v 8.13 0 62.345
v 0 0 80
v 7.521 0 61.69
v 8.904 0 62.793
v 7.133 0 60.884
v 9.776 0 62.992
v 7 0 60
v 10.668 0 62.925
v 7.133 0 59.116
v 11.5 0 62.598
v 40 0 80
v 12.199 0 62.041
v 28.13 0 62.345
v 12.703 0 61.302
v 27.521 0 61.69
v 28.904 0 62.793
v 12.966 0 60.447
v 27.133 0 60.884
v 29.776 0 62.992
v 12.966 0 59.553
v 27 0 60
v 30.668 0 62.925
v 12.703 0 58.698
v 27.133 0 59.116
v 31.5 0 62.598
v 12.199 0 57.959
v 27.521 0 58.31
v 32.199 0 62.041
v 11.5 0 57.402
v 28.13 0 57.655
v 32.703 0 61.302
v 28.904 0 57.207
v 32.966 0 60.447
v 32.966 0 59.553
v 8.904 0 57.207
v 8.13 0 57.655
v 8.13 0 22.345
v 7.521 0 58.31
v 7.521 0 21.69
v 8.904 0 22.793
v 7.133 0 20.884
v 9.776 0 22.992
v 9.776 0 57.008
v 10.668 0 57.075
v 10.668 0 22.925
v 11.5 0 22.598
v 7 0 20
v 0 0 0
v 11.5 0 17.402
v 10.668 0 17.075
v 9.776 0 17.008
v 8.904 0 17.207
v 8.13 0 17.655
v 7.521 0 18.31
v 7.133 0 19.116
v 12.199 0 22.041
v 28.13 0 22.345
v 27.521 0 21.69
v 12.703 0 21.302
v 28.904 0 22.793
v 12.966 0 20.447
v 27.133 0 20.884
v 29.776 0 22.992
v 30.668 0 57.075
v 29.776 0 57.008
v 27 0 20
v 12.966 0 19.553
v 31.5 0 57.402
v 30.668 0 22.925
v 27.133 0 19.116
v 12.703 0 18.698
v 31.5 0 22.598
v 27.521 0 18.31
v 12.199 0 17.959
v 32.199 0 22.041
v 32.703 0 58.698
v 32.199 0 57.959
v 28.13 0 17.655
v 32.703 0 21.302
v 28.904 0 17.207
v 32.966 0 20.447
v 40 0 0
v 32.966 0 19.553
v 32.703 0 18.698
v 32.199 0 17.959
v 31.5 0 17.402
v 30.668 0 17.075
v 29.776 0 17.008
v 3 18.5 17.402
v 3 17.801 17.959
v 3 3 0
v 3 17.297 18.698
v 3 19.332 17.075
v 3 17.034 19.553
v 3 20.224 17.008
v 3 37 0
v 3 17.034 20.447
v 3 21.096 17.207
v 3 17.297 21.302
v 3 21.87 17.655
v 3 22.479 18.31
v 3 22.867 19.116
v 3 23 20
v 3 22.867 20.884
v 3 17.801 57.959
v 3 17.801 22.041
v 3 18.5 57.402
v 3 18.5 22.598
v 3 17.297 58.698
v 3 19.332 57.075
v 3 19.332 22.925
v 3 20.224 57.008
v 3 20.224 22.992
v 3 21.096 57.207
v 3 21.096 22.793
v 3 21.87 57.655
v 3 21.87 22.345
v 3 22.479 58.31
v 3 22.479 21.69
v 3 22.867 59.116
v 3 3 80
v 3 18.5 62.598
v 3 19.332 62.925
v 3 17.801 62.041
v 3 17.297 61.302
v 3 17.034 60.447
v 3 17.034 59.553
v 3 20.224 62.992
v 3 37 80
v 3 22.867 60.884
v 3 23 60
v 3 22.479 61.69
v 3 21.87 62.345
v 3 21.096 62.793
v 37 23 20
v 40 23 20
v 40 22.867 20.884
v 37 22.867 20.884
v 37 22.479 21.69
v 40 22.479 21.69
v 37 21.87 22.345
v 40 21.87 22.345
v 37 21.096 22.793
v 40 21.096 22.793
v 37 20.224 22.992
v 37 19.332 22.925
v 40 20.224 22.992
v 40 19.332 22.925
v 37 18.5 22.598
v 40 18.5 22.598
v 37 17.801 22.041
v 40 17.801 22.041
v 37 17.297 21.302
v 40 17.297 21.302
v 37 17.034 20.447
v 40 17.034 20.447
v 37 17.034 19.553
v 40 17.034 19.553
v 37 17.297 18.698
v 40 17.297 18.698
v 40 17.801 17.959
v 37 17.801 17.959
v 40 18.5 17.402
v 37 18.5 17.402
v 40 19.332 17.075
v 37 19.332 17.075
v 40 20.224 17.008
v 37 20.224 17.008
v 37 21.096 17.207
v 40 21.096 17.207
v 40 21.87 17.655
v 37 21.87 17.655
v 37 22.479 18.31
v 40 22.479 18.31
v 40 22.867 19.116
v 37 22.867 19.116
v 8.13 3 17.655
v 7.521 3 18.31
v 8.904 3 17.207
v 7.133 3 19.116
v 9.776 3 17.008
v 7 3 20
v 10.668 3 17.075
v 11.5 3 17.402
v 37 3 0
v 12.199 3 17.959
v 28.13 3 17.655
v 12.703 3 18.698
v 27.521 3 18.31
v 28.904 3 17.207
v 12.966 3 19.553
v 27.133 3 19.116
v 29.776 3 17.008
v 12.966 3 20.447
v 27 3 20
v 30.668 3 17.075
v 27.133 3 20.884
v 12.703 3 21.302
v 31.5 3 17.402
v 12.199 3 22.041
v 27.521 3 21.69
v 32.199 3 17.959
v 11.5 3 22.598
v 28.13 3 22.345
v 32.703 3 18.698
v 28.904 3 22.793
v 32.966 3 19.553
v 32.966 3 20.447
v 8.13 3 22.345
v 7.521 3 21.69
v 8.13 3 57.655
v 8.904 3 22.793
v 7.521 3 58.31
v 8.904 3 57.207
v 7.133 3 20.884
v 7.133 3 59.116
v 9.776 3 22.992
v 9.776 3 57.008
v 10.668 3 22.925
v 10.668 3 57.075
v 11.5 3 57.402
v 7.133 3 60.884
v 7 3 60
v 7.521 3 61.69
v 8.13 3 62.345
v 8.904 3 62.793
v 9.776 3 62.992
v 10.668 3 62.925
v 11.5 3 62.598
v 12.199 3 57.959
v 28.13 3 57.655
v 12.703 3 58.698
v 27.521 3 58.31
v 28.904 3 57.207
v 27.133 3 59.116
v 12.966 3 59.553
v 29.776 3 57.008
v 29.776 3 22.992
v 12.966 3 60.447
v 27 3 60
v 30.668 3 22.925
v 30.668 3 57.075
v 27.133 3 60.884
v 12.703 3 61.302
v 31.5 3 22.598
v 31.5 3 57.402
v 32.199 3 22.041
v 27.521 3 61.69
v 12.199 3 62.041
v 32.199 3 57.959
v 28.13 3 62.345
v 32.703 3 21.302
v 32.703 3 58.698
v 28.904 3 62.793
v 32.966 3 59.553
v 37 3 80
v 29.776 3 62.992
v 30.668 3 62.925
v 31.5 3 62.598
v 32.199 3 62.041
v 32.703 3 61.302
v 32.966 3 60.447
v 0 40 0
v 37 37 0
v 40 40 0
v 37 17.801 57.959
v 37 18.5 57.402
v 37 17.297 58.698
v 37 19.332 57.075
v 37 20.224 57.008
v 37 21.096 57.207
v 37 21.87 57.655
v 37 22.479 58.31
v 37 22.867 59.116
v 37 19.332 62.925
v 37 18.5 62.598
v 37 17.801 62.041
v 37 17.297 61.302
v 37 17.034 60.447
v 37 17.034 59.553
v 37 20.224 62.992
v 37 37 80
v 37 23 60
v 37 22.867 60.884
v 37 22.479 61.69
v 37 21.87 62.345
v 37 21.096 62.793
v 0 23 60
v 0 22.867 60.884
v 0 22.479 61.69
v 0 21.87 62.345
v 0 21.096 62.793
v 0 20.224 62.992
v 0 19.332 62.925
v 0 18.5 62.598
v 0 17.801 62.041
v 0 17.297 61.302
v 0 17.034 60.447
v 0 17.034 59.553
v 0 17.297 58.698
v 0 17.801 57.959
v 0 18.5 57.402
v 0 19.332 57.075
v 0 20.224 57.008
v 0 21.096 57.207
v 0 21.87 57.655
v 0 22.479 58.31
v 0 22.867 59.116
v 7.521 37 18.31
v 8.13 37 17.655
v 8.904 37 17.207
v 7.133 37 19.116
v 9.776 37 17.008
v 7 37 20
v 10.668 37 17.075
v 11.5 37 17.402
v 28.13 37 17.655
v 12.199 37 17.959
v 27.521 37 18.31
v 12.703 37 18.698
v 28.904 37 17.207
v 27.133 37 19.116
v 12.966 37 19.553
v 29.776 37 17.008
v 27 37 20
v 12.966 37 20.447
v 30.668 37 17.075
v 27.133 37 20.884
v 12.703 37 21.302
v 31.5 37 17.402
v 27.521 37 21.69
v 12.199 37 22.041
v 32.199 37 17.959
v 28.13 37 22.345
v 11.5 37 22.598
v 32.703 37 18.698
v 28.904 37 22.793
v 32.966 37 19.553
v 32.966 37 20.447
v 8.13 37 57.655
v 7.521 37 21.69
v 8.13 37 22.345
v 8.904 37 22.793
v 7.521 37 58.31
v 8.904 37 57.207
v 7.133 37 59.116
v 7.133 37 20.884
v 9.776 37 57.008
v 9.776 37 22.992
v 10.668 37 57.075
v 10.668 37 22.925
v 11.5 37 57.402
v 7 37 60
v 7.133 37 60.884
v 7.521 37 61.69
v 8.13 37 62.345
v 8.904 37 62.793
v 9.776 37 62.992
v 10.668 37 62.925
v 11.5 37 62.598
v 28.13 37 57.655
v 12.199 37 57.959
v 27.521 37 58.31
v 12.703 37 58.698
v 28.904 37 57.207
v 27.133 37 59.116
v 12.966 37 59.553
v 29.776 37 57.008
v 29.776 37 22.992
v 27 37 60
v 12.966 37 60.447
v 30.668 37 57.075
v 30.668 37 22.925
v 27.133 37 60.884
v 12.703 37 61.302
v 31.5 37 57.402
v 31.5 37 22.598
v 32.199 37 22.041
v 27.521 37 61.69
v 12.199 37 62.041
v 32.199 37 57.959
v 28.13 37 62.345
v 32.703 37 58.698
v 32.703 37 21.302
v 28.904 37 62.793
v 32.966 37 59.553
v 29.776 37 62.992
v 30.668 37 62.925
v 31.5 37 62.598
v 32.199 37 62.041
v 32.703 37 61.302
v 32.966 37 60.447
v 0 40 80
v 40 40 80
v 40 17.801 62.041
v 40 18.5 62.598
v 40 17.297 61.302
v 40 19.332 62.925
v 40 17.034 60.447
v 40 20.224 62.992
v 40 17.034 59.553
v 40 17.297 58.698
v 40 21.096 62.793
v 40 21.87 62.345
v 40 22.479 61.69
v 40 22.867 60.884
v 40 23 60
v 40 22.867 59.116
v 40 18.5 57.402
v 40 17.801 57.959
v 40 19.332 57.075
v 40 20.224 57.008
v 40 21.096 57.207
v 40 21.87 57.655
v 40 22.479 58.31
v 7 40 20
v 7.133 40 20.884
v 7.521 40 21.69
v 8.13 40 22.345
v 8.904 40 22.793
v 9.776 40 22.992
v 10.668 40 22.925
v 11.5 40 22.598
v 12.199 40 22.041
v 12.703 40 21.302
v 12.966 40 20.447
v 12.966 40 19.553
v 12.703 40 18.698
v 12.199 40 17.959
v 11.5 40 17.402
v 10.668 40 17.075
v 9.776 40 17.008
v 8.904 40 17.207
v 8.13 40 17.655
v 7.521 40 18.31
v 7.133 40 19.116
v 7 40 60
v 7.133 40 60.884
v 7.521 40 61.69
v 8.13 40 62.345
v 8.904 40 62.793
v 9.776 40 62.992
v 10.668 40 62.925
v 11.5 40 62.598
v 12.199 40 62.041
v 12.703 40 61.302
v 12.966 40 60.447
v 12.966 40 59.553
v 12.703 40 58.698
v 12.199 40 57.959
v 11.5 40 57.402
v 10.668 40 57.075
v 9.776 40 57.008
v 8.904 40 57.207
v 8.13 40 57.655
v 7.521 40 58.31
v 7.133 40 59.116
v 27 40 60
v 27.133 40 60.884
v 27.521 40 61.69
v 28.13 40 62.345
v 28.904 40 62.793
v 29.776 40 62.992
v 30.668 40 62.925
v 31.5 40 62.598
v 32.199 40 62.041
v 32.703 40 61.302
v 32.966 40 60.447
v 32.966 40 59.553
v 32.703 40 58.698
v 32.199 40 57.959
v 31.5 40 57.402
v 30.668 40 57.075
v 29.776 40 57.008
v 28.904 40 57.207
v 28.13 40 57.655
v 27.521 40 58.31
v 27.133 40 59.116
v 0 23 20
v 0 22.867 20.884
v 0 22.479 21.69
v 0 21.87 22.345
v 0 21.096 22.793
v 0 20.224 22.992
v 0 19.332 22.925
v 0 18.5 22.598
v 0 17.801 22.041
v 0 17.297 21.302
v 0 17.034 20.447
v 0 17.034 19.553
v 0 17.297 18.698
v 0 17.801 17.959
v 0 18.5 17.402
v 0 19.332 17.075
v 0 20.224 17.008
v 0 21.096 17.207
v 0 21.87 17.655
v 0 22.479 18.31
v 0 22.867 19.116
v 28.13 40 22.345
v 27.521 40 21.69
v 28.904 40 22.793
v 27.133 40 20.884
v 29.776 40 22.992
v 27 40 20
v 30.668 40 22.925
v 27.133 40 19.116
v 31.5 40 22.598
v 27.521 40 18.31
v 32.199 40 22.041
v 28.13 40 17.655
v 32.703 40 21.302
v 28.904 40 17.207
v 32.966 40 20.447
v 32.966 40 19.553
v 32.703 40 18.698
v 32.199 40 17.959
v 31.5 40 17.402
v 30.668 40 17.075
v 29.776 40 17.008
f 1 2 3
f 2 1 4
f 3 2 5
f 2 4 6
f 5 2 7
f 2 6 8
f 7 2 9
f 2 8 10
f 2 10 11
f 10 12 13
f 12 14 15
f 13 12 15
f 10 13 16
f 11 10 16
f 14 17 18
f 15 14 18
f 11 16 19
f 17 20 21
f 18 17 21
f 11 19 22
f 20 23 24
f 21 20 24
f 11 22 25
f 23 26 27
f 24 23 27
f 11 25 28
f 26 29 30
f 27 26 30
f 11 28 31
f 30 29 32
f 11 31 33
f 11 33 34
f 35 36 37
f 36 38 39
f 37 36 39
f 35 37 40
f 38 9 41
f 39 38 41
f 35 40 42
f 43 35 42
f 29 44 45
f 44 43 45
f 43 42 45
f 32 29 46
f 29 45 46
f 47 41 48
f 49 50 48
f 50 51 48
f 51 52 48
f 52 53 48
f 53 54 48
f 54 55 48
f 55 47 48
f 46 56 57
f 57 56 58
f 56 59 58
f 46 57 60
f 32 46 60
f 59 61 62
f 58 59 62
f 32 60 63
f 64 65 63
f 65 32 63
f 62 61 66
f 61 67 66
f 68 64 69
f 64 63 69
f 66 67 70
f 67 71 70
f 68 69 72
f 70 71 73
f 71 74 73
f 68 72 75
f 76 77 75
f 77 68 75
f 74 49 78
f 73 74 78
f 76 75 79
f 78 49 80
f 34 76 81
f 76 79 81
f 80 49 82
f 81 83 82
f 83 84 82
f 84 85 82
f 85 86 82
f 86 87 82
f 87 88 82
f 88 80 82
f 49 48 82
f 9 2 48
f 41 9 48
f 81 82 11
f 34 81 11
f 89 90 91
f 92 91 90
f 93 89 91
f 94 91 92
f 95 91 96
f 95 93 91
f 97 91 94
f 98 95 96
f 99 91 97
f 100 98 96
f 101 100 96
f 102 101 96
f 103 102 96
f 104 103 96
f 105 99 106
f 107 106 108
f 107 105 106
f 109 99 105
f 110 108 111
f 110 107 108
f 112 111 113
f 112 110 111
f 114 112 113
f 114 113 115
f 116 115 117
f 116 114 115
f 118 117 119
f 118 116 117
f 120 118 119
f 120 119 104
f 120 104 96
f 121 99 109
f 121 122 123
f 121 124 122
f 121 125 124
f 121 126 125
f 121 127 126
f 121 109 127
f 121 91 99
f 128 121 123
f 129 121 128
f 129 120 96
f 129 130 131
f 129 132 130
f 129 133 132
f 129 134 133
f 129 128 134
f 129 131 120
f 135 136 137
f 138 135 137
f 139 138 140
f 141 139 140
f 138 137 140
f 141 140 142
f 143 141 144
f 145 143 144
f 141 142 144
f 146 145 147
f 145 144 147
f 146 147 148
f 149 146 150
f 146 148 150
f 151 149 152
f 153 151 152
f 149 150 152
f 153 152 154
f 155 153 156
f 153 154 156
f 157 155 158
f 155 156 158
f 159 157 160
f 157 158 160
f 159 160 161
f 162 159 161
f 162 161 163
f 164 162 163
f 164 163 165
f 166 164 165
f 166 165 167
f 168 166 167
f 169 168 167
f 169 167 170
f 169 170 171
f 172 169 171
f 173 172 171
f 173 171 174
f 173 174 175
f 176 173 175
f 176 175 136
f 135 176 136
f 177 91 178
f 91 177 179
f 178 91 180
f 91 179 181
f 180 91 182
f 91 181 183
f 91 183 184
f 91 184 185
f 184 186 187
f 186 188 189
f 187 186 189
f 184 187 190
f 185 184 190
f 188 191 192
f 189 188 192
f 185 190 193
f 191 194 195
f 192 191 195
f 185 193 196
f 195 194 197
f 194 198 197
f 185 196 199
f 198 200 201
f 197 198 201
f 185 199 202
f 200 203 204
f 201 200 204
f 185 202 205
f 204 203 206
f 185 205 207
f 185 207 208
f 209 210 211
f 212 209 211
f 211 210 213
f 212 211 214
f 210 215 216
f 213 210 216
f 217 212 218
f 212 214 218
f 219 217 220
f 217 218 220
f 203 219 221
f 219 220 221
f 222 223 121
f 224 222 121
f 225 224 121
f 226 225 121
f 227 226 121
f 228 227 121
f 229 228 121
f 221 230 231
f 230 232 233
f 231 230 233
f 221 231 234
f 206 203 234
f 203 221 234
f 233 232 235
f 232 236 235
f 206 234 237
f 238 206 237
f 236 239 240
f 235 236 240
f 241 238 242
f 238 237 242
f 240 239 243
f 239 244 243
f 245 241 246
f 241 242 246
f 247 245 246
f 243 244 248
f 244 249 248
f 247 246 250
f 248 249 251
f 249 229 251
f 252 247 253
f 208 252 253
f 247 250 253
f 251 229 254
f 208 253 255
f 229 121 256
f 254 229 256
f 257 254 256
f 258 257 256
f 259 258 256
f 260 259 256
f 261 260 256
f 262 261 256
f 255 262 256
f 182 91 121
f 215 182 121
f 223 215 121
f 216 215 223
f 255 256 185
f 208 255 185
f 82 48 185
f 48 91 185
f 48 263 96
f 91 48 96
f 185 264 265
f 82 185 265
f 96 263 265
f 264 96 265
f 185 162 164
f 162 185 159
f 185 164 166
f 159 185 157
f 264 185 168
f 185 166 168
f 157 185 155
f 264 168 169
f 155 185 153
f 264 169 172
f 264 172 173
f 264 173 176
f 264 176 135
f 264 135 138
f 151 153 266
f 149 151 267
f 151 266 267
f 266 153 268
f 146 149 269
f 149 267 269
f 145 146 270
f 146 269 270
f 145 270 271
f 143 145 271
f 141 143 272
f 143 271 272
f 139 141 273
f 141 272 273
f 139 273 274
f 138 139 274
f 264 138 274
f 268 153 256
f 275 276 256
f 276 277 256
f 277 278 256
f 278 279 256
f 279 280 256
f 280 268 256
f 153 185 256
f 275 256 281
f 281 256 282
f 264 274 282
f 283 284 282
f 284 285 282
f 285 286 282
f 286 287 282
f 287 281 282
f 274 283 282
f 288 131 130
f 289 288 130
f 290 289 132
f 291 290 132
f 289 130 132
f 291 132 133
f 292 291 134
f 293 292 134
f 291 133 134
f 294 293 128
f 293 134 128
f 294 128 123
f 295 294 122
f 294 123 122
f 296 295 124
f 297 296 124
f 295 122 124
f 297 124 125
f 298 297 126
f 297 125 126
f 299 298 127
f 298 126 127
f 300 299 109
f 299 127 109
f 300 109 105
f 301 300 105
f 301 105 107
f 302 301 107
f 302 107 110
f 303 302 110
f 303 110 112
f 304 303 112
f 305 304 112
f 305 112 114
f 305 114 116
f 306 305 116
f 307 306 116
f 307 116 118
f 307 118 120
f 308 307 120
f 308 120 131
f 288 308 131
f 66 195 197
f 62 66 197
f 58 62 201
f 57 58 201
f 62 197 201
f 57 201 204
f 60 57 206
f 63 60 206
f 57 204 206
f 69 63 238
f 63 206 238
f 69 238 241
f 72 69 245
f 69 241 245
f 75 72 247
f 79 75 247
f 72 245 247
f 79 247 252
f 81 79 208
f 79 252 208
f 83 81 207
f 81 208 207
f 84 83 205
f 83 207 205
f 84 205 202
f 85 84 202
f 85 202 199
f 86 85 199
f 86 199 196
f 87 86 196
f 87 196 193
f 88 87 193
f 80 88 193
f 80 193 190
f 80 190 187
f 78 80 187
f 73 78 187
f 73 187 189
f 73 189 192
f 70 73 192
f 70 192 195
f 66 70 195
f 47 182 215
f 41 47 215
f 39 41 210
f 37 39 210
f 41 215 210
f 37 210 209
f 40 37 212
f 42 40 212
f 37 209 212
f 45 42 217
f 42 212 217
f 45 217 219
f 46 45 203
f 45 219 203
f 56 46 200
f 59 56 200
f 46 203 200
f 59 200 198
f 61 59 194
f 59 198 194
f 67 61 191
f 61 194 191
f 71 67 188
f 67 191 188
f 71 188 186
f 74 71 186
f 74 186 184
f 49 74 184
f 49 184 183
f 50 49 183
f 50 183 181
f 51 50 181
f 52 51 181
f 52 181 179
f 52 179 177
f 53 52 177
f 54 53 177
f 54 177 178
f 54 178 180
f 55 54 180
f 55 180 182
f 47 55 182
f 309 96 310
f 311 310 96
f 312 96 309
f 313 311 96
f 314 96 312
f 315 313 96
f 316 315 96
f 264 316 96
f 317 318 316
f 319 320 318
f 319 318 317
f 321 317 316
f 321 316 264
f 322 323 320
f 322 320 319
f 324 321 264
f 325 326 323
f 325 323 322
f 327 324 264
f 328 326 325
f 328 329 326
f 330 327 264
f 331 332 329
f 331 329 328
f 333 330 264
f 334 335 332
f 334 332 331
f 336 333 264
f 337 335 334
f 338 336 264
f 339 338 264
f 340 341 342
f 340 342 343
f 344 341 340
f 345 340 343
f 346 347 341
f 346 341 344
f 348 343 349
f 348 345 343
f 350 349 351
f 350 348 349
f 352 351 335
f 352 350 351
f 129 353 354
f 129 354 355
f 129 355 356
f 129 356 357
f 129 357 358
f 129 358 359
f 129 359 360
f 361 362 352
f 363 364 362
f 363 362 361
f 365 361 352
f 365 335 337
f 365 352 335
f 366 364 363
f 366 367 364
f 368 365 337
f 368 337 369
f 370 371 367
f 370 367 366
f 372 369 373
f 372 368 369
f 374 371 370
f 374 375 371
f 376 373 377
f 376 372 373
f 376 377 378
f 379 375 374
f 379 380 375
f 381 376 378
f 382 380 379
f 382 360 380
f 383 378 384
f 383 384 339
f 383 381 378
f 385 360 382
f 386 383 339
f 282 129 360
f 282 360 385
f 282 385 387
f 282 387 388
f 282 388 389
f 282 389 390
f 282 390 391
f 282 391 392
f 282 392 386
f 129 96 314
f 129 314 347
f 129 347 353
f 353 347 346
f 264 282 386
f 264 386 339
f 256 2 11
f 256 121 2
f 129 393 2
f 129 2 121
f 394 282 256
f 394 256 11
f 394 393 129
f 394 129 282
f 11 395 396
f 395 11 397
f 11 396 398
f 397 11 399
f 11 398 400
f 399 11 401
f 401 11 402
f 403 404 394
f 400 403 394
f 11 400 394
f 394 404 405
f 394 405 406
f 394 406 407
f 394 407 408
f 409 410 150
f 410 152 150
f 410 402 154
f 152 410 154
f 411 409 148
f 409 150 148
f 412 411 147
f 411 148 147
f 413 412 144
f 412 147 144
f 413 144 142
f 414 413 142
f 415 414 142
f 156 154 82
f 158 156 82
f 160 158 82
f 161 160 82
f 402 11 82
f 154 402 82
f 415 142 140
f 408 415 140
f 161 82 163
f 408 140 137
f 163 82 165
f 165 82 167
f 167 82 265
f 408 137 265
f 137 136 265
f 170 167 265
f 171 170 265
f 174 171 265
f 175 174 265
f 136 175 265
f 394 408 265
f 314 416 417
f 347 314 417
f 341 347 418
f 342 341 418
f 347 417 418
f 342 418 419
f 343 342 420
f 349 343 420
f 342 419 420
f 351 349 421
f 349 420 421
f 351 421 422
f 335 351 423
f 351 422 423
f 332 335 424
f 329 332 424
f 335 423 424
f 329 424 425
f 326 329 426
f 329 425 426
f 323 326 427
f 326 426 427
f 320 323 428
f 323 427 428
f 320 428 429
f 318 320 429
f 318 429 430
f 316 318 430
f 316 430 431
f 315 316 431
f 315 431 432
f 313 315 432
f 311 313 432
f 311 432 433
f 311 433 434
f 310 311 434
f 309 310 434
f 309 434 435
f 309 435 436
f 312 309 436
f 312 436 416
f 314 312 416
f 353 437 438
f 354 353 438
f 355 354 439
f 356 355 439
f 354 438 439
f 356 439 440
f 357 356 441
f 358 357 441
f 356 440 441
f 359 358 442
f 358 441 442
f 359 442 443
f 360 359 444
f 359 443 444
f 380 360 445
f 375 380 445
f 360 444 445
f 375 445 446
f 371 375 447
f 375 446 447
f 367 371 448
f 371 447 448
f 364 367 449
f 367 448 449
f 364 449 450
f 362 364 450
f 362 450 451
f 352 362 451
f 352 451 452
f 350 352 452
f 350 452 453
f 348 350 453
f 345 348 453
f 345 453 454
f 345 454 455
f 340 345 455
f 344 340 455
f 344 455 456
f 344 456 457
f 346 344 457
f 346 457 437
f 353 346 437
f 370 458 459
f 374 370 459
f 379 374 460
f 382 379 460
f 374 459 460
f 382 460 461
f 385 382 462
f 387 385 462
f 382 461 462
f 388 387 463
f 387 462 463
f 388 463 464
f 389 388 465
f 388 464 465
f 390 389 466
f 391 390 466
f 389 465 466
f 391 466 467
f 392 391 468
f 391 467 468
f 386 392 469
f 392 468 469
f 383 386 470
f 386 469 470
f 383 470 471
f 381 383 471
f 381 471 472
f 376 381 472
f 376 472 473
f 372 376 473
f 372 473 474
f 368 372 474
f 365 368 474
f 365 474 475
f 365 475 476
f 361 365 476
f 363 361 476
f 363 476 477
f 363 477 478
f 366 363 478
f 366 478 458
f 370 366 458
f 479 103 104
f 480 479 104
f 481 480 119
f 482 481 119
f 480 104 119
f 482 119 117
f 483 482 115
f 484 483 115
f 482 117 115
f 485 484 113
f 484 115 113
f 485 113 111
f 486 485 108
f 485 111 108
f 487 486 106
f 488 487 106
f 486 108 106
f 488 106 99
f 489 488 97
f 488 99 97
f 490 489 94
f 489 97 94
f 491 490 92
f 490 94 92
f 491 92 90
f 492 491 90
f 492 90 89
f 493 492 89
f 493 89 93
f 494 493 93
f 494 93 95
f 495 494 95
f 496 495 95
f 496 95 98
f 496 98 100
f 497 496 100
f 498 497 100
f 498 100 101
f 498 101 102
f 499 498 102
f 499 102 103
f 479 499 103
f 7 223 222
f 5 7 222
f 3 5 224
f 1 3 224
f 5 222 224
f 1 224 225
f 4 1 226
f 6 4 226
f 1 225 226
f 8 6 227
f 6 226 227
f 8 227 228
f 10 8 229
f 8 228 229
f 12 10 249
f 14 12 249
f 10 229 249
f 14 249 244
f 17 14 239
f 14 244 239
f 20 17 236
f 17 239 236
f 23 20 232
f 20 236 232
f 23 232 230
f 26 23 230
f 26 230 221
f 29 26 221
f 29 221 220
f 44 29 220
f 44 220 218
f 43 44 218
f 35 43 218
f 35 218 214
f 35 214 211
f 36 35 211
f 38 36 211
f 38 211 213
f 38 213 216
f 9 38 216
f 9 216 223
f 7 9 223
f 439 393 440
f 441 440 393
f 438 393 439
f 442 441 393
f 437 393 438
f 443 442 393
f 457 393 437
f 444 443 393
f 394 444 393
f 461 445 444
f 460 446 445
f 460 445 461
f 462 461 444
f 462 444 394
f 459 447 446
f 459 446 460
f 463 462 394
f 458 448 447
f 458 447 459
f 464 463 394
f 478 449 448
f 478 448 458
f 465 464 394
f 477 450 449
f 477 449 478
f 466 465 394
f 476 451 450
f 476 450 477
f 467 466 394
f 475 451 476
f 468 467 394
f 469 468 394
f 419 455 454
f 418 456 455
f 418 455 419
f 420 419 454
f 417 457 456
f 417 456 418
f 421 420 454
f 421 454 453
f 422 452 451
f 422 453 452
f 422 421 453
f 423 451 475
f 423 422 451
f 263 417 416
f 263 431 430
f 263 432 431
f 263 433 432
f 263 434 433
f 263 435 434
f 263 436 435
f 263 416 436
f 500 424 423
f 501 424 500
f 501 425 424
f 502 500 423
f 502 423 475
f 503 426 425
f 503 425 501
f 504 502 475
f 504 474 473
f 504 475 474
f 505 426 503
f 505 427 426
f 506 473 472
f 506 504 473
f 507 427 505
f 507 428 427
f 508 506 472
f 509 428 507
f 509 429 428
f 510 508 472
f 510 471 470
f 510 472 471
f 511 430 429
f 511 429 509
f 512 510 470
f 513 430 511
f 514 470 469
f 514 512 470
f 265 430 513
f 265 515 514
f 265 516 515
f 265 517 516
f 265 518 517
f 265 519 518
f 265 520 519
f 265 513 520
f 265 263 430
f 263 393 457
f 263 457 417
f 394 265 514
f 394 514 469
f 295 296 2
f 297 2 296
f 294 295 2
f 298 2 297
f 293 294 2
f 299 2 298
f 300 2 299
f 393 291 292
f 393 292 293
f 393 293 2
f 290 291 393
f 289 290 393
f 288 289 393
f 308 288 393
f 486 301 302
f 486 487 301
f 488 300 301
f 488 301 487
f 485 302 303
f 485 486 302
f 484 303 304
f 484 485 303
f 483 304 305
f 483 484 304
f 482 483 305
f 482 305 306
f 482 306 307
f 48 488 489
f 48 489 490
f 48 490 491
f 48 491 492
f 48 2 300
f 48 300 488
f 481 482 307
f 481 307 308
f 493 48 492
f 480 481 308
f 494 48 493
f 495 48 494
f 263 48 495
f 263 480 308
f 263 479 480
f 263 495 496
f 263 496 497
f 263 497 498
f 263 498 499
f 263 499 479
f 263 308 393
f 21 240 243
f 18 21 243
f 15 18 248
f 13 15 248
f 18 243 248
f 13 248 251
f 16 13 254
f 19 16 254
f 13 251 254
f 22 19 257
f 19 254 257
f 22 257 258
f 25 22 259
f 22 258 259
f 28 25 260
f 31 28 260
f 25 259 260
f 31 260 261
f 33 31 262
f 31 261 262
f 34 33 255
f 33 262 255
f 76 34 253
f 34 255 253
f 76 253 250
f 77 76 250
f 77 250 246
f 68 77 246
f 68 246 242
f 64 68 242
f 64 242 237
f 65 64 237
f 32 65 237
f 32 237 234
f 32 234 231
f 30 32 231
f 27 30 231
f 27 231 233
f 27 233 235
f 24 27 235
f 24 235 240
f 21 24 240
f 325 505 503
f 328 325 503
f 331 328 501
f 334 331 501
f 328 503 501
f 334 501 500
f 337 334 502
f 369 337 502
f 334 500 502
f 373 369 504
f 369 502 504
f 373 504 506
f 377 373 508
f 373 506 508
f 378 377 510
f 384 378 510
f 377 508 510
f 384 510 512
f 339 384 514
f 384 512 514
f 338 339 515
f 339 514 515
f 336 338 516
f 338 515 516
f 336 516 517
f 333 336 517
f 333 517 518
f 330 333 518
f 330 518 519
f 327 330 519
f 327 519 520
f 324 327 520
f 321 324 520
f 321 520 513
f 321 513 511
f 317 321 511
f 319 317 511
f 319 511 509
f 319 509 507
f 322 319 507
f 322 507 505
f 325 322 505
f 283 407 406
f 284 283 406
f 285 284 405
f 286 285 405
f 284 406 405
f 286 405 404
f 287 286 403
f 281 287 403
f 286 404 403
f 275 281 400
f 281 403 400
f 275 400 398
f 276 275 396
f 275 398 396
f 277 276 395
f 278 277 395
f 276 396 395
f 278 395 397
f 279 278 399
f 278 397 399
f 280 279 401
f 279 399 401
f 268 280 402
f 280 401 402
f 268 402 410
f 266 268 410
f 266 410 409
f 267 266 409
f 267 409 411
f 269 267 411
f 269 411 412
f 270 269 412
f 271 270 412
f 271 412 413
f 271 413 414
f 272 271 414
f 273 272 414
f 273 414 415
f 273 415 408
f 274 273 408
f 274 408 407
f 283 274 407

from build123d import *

# Parameters (mm, degrees)
SKETCH_W        = 40
SKETCH_H        = 40
PAD_DEPTH       = 80
SKETCH001_W     = 34
SKETCH001_H     = 34
POCKET_DEPTH    = 80
SKETCH002_R     = 3
POCKET001_DEPTH = 40
SKETCH003_R     = 3
POCKET002_DEPTH = 40


with BuildPart() as part:
    # Sketch → Pad (new body)
    with BuildSketch(Plane.XY):
        with Locations((20, 20)):
            Rectangle(SKETCH_W, SKETCH_H)
    extrude(amount=PAD_DEPTH)

    # Sketch001 (on Face6 of Pad) → Pocket (cut)
    with BuildSketch(Plane.XY.offset(80)):
        with Locations((20, 20)):
            Rectangle(SKETCH001_W, SKETCH001_H)
    extrude(amount=-POCKET_DEPTH, mode=Mode.SUBTRACT)

    # Sketch002 (on Face1 of Pocket) → Pocket001 (cut)
    with BuildSketch(Plane(origin=(0, 40, 0), x_dir=(-1, 0, 0), z_dir=(0, 1, 0))):
        with Locations((-30, 60)):
            Circle(SKETCH002_R)
        with Locations((-10, 60)):
            Circle(SKETCH002_R)
        with Locations((-30, 20)):
            Circle(SKETCH002_R)
        with Locations((-10, 20)):
            Circle(SKETCH002_R)
    extrude(amount=-POCKET001_DEPTH, mode=Mode.SUBTRACT)

    # Sketch003 (on Face5 of Pocket001) → Pocket002 (cut)
    with BuildSketch(Plane.YZ.offset(40)):
        with Locations((20, 60)):
            Circle(SKETCH003_R)
        with Locations((20, 20)):
            Circle(SKETCH003_R)
    extrude(amount=-POCKET002_DEPTH, mode=Mode.SUBTRACT)


solid = part.part
